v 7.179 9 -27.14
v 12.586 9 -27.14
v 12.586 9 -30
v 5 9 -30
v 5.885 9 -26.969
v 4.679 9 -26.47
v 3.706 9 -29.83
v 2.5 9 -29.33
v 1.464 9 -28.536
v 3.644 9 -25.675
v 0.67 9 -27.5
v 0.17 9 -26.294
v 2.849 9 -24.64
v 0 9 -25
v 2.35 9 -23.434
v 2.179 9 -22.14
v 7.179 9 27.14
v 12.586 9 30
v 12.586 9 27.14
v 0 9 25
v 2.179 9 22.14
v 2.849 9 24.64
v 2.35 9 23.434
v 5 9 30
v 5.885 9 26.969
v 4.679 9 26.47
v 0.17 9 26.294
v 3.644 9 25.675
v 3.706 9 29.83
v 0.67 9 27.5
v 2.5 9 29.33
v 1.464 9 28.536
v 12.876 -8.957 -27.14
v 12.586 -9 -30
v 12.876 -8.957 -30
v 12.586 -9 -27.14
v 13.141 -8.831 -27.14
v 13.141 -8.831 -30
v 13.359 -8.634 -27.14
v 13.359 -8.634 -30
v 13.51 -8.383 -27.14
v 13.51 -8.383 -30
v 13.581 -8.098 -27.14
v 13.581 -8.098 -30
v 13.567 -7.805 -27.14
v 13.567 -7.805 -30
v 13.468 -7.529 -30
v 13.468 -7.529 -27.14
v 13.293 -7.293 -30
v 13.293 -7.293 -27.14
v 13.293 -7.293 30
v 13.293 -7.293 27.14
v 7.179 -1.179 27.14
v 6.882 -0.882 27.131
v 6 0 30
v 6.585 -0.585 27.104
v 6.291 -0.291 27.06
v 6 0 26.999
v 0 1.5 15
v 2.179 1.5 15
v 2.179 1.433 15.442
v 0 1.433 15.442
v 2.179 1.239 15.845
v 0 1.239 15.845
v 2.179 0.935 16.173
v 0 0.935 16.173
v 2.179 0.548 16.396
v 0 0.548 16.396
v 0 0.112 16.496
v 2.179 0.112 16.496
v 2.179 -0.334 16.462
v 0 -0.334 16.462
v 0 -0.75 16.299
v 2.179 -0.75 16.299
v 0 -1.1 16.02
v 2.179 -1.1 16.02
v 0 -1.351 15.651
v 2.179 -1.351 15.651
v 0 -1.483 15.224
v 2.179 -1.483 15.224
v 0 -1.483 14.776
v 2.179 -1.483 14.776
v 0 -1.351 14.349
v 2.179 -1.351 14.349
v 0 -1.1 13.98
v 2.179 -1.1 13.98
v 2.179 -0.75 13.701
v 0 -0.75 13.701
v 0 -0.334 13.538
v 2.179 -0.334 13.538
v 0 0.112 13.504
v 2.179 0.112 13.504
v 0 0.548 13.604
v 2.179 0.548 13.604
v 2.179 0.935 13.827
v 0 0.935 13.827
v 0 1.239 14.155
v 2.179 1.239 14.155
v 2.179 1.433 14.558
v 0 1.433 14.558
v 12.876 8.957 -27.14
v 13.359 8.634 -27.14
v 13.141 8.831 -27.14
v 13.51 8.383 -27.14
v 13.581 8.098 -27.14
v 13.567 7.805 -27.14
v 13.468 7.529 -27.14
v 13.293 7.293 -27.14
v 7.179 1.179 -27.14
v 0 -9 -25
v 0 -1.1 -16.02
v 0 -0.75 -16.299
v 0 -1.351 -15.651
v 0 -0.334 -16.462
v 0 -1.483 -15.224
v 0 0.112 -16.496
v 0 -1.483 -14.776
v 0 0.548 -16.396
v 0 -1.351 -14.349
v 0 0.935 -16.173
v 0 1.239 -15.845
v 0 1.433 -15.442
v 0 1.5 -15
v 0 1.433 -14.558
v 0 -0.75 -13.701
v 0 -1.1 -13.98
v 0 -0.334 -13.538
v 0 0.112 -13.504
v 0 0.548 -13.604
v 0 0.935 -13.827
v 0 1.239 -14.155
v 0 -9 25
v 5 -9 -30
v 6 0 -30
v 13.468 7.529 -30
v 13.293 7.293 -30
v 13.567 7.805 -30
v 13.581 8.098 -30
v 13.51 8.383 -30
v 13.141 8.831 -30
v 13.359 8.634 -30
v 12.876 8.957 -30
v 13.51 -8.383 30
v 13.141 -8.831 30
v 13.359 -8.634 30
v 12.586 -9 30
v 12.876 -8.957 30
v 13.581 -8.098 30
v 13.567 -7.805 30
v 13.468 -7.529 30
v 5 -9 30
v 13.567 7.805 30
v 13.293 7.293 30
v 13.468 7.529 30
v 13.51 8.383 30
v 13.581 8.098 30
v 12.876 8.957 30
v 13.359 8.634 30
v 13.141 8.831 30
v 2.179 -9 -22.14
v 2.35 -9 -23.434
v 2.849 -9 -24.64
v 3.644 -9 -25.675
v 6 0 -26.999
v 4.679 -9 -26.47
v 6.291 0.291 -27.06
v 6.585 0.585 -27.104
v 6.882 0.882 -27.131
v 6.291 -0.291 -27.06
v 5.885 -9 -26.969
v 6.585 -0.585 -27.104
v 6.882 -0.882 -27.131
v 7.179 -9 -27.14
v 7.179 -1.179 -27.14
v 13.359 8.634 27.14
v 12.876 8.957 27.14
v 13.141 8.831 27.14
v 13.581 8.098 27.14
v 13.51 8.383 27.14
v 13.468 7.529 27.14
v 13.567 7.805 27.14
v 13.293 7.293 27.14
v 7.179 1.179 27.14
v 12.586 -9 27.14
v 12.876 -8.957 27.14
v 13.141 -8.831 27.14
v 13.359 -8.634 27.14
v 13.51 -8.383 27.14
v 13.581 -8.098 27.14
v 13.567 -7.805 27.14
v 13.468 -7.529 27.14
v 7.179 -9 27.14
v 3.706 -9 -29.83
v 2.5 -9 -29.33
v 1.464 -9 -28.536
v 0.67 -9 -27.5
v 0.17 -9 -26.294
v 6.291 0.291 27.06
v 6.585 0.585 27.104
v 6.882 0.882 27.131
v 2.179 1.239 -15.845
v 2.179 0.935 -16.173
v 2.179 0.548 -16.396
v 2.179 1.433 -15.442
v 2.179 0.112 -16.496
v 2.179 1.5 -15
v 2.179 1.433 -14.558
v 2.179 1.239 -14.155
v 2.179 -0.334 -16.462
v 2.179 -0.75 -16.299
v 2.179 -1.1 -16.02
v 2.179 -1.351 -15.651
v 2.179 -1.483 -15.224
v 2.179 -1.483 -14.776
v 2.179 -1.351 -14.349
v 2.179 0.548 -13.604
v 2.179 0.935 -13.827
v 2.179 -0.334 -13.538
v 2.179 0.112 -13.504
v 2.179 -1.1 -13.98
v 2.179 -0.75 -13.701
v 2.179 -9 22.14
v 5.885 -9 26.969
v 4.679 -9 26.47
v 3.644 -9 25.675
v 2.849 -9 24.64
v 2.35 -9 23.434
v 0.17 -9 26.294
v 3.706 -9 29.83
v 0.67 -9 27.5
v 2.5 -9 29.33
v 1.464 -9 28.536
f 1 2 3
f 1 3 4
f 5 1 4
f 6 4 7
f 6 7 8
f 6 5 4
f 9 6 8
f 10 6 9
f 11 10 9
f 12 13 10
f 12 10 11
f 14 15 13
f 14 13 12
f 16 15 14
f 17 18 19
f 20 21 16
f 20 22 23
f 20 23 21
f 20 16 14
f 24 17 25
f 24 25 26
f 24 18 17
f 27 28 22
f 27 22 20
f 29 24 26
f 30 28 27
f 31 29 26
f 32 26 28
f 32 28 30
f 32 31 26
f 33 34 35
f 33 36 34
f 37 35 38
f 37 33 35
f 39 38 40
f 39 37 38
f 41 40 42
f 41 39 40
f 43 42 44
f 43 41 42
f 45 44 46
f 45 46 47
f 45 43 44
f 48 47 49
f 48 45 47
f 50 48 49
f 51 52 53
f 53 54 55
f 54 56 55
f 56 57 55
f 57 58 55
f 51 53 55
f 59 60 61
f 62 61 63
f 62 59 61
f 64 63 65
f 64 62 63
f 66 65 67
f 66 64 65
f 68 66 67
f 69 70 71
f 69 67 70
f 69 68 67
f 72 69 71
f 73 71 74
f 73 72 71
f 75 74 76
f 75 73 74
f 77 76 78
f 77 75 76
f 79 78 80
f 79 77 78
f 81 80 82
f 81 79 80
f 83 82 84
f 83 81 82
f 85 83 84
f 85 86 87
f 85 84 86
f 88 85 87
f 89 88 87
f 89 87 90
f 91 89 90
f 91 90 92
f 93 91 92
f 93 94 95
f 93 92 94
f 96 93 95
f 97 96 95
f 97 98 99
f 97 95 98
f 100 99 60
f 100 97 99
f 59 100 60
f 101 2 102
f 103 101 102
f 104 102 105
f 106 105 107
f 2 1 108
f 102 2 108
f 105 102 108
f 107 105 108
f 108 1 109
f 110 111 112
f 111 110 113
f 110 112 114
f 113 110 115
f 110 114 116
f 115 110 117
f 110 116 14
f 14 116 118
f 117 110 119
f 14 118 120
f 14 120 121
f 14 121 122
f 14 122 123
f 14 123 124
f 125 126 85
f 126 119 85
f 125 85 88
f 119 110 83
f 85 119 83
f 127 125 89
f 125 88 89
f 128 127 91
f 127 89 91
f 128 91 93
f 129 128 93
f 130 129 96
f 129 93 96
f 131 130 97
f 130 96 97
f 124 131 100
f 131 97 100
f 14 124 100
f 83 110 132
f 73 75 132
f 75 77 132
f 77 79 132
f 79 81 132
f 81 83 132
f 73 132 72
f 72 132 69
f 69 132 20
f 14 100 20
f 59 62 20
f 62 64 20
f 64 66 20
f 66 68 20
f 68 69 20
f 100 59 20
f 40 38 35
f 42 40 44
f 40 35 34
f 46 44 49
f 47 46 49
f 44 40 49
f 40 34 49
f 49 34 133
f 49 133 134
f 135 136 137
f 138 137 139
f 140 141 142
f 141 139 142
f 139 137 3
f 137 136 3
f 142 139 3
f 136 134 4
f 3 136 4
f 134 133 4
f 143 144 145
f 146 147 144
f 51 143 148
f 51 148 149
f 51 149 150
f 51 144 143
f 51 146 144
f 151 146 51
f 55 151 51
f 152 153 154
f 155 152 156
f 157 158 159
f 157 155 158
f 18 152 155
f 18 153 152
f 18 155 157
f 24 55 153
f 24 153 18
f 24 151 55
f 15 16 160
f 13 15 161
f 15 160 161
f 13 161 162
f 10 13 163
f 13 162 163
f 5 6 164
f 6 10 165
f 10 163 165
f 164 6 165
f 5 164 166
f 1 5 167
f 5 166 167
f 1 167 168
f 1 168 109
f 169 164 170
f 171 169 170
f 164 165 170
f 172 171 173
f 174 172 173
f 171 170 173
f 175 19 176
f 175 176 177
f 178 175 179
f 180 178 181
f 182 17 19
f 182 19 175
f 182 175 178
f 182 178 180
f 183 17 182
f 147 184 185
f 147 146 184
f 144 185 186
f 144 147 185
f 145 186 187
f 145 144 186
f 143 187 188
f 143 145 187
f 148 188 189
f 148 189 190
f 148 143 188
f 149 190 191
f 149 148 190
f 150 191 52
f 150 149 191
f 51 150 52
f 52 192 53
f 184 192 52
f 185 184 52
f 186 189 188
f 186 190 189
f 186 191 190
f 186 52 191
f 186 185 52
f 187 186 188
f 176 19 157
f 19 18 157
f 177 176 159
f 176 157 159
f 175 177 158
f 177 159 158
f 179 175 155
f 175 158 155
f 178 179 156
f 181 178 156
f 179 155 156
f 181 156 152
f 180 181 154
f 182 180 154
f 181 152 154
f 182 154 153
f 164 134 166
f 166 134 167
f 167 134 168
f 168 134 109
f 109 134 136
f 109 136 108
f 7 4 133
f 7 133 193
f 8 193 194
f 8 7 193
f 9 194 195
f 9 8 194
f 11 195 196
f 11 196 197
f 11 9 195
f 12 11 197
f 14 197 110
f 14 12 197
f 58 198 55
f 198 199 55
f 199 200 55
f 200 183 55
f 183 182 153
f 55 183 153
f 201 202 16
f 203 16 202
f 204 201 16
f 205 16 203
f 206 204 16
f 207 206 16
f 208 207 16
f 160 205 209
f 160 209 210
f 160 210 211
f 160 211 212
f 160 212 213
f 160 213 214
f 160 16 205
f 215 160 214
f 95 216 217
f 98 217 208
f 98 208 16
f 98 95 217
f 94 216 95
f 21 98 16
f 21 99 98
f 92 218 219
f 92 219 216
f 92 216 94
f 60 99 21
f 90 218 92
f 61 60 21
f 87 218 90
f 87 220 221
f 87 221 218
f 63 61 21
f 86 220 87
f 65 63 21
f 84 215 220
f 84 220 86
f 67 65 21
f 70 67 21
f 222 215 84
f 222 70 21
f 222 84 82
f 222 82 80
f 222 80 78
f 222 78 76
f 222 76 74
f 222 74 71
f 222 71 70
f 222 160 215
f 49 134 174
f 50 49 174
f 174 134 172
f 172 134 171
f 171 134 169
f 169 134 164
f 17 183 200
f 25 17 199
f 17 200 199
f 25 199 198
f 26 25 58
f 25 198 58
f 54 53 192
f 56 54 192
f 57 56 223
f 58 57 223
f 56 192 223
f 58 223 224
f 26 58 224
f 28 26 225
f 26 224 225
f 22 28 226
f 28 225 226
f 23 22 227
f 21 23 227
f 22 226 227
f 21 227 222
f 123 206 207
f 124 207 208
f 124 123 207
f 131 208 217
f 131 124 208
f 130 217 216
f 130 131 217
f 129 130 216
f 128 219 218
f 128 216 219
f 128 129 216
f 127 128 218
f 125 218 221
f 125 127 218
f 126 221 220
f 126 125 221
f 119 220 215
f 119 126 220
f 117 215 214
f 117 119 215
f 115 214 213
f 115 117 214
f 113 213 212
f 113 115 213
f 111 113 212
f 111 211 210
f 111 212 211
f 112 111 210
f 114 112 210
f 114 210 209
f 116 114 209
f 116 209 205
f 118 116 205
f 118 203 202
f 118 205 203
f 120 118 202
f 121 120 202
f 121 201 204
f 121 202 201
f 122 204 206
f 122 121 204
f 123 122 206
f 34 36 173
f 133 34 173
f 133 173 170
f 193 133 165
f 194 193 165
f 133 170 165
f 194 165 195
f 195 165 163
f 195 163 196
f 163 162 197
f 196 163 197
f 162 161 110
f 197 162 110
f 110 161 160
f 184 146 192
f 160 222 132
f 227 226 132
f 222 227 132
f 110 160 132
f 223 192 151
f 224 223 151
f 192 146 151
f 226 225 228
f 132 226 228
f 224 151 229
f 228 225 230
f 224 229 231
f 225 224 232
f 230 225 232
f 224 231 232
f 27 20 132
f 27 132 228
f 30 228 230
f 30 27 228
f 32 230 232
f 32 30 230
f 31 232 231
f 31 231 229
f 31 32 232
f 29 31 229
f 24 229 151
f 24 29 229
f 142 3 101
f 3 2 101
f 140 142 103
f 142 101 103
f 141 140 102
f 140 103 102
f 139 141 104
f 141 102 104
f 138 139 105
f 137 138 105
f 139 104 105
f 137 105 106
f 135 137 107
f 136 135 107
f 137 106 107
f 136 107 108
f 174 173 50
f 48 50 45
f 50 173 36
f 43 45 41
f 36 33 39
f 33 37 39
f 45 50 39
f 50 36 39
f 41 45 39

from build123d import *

# Parameters (mm, degrees)
F0_W         = 18
F0_H         = 60
F0_R         = 1.5
F1_DEPTH     = 15
F3_DEPTH     = 80
F4_W         = 12.820621879
F4_H         = 54.2796626687
F5_DEPTH     = 25
F6_R         = 1
F7_T4_DEPTH  = 18
F7_T10_DEPTH = 18
F7_T16_DEPTH = 18
F7_T22_DEPTH = 18
F7_T28_DEPTH = 18
F7_T34_DEPTH = 18
F7_T37_DEPTH = 43


# Not quite as in the source:
# - a fillet or chamfer that OpenCascade refuses, or shapes differently, is made with other operations: its cross-section is extruded or revolved along the edge and cut away or added


with BuildPart() as f1:
    # F0 (on Right) → F1 (new body)
    with BuildSketch(Plane.YZ):
        Rectangle(F0_W, F0_H)
        with Locations((0, -15)):
            Circle(F0_R, mode=Mode.SUBTRACT)
        with Locations((0, 15)):
            Circle(F0_R, mode=Mode.SUBTRACT)
    extrude(amount=F1_DEPTH)

    # F2 (on face) → F3 (cut)
    with BuildSketch(Plane.XY.offset(30)):
        Polygon((15, -9), (15, 9), (6, 0), align=None)
    extrude(amount=-F3_DEPTH, mode=Mode.SUBTRACT)

    # F4 (on face) → F5 (cut)
    with BuildSketch(Plane.XZ.offset(9)):
        with Locations((8.5896890605, 0)):
            Rectangle(F4_W, F4_H)
    extrude(amount=-F5_DEPTH, mode=Mode.SUBTRACT)

    # F6
    f6_edges = [f1.edges().sort_by_distance(p)[0] for p in [
        (15, -9, 28.569916),
        (15, 9, 28.569916),
        (15, -9, -28.569916),
        (15, 9, -28.569916),
    ]]
    fillet(f6_edges, radius=F6_R)

    # F7: fillet of radius 5 on 4 edges, made by hand


with BuildPart() as f7_tool2:
    # F7_s3 → F7_t4 (new body)
    with BuildSketch(Plane.XZ.offset(9)):
        with BuildLine():
            ThreePointArc((7.179378121, 27.1398313344), (3.6438442151, 25.6753652403), (2.179378121, 22.1398313344))
            Line((2.179378121, 22.1398313344), (2.179378121, 27.1398313344))
            Line((2.179378121, 27.1398313344), (7.179378121, 27.1398313344))
        make_face()
    extrude(amount=-F7_T4_DEPTH)

    split(bisect_by=Plane(origin=(3, 3, 0), x_dir=(0, 0, 1), z_dir=(-0.7071067812, -0.7071067812, 0)), keep=Keep.TOP)

    split(bisect_by=Plane(origin=(3, -3, 0), x_dir=(0, 0, 1), z_dir=(0.7071067812, -0.7071067812, 0)), keep=Keep.TOP)


with BuildPart() as f1_1:
    add(f1.part)

    # F7_t1: union F7_tool2
    add(f7_tool2.part)


with BuildPart() as f7_tool8:
    # F7_s9 → F7_t10 (new body)
    with BuildSketch(Plane.XZ.offset(9)):
        with BuildLine():
            ThreePointArc((7.179378121, 27.1398313344), (3.6438442151, 25.6753652403), (2.179378121, 22.1398313344))
            Line((2.179378121, 22.1398313344), (2.179378121, 27.1398313344))
            Line((2.179378121, 27.1398313344), (7.179378121, 27.1398313344))
        make_face()
    extrude(amount=-F7_T10_DEPTH)

    split(bisect_by=Plane(origin=(3, 3, 0), x_dir=(0, 0, 1), z_dir=(-0.7071067812, -0.7071067812, 0)), keep=Keep.TOP)

    split(bisect_by=Plane(origin=(3, -3, 0), x_dir=(0, 0, 1), z_dir=(-0.7071067812, 0.7071067812, 0)), keep=Keep.TOP)


with BuildPart() as f1_2:
    add(f1_1.part)

    # F7_t7: union F7_tool8
    add(f7_tool8.part)


with BuildPart() as f7_tool14:
    # F7_s15 → F7_t16 (new body)
    with BuildSketch(Plane.XZ.offset(9)):
        with BuildLine():
            ThreePointArc((7.179378121, 27.1398313344), (3.6438442151, 25.6753652403), (2.179378121, 22.1398313344))
            Line((2.179378121, 22.1398313344), (2.179378121, 27.1398313344))
            Line((2.179378121, 27.1398313344), (7.179378121, 27.1398313344))
        make_face()
    extrude(amount=-F7_T16_DEPTH)

    split(bisect_by=Plane(origin=(3, 3, 0), x_dir=(0, 0, 1), z_dir=(0.7071067812, 0.7071067812, 0)), keep=Keep.TOP)

    split(bisect_by=Plane(origin=(3, -3, 0), x_dir=(0, 0, 1), z_dir=(-0.7071067812, 0.7071067812, 0)), keep=Keep.TOP)


with BuildPart() as f1_3:
    add(f1_2.part)

    # F7_t13: union F7_tool14
    add(f7_tool14.part)


with BuildPart() as f7_tool20:
    # F7_s21 → F7_t22 (new body)
    with BuildSketch(Plane.XZ.offset(9)):
        with BuildLine():
            ThreePointArc((2.179378121, -22.1398313344), (3.6438442151, -25.6753652403), (7.179378121, -27.1398313344))
            Line((7.179378121, -27.1398313344), (2.179378121, -27.1398313344))
            Line((2.179378121, -27.1398313344), (2.179378121, -22.1398313344))
        make_face()
    extrude(amount=-F7_T22_DEPTH)

    split(bisect_by=Plane(origin=(3, 3, 0), x_dir=(0, 0, 1), z_dir=(-0.7071067812, -0.7071067812, 0)), keep=Keep.TOP)

    split(bisect_by=Plane(origin=(3, -3, 0), x_dir=(0, 0, 1), z_dir=(0.7071067812, -0.7071067812, 0)), keep=Keep.TOP)


with BuildPart() as f1_4:
    add(f1_3.part)

    # F7_t19: union F7_tool20
    add(f7_tool20.part)


with BuildPart() as f7_tool26:
    # F7_s27 → F7_t28 (new body)
    with BuildSketch(Plane.XZ.offset(9)):
        with BuildLine():
            ThreePointArc((2.179378121, -22.1398313344), (3.6438442151, -25.6753652403), (7.179378121, -27.1398313344))
            Line((7.179378121, -27.1398313344), (2.179378121, -27.1398313344))
            Line((2.179378121, -27.1398313344), (2.179378121, -22.1398313344))
        make_face()
    extrude(amount=-F7_T28_DEPTH)

    split(bisect_by=Plane(origin=(3, 3, 0), x_dir=(0, 0, 1), z_dir=(-0.7071067812, -0.7071067812, 0)), keep=Keep.TOP)

    split(bisect_by=Plane(origin=(3, -3, 0), x_dir=(0, 0, 1), z_dir=(-0.7071067812, 0.7071067812, 0)), keep=Keep.TOP)


with BuildPart() as f1_5:
    add(f1_4.part)

    # F7_t25: union F7_tool26
    add(f7_tool26.part)


with BuildPart() as f7_tool32:
    # F7_s33 → F7_t34 (new body)
    with BuildSketch(Plane.XZ.offset(9)):
        with BuildLine():
            ThreePointArc((2.179378121, -22.1398313344), (3.6438442151, -25.6753652403), (7.179378121, -27.1398313344))
            Line((7.179378121, -27.1398313344), (2.179378121, -27.1398313344))
            Line((2.179378121, -27.1398313344), (2.179378121, -22.1398313344))
        make_face()
    extrude(amount=-F7_T34_DEPTH)

    split(bisect_by=Plane(origin=(3, 3, 0), x_dir=(0, 0, 1), z_dir=(0.7071067812, 0.7071067812, 0)), keep=Keep.TOP)

    split(bisect_by=Plane(origin=(3, -3, 0), x_dir=(0, 0, 1), z_dir=(-0.7071067812, 0.7071067812, 0)), keep=Keep.TOP)


with BuildPart() as f1_6:
    add(f1_5.part)

    # F7_t31: union F7_tool32
    add(f7_tool32.part)

    # F7_s38 → F7_t37 (cut)
    with BuildSketch(Plane.XZ.offset(-21.5)):
        with BuildLine():
            ThreePointArc((0, 25), (1.4644660941, 28.5355339059), (5, 30))
            Line((5, 30), (0, 30))
            Line((0, 30), (0, 25))
        make_face()
        with BuildLine():
            ThreePointArc((5, -30), (1.4644660941, -28.5355339059), (0, -25))
            Line((0, -25), (0, -30))
            Line((0, -30), (5, -30))
        make_face()
    extrude(amount=F7_T37_DEPTH, mode=Mode.SUBTRACT)


solid = f1_6.part
